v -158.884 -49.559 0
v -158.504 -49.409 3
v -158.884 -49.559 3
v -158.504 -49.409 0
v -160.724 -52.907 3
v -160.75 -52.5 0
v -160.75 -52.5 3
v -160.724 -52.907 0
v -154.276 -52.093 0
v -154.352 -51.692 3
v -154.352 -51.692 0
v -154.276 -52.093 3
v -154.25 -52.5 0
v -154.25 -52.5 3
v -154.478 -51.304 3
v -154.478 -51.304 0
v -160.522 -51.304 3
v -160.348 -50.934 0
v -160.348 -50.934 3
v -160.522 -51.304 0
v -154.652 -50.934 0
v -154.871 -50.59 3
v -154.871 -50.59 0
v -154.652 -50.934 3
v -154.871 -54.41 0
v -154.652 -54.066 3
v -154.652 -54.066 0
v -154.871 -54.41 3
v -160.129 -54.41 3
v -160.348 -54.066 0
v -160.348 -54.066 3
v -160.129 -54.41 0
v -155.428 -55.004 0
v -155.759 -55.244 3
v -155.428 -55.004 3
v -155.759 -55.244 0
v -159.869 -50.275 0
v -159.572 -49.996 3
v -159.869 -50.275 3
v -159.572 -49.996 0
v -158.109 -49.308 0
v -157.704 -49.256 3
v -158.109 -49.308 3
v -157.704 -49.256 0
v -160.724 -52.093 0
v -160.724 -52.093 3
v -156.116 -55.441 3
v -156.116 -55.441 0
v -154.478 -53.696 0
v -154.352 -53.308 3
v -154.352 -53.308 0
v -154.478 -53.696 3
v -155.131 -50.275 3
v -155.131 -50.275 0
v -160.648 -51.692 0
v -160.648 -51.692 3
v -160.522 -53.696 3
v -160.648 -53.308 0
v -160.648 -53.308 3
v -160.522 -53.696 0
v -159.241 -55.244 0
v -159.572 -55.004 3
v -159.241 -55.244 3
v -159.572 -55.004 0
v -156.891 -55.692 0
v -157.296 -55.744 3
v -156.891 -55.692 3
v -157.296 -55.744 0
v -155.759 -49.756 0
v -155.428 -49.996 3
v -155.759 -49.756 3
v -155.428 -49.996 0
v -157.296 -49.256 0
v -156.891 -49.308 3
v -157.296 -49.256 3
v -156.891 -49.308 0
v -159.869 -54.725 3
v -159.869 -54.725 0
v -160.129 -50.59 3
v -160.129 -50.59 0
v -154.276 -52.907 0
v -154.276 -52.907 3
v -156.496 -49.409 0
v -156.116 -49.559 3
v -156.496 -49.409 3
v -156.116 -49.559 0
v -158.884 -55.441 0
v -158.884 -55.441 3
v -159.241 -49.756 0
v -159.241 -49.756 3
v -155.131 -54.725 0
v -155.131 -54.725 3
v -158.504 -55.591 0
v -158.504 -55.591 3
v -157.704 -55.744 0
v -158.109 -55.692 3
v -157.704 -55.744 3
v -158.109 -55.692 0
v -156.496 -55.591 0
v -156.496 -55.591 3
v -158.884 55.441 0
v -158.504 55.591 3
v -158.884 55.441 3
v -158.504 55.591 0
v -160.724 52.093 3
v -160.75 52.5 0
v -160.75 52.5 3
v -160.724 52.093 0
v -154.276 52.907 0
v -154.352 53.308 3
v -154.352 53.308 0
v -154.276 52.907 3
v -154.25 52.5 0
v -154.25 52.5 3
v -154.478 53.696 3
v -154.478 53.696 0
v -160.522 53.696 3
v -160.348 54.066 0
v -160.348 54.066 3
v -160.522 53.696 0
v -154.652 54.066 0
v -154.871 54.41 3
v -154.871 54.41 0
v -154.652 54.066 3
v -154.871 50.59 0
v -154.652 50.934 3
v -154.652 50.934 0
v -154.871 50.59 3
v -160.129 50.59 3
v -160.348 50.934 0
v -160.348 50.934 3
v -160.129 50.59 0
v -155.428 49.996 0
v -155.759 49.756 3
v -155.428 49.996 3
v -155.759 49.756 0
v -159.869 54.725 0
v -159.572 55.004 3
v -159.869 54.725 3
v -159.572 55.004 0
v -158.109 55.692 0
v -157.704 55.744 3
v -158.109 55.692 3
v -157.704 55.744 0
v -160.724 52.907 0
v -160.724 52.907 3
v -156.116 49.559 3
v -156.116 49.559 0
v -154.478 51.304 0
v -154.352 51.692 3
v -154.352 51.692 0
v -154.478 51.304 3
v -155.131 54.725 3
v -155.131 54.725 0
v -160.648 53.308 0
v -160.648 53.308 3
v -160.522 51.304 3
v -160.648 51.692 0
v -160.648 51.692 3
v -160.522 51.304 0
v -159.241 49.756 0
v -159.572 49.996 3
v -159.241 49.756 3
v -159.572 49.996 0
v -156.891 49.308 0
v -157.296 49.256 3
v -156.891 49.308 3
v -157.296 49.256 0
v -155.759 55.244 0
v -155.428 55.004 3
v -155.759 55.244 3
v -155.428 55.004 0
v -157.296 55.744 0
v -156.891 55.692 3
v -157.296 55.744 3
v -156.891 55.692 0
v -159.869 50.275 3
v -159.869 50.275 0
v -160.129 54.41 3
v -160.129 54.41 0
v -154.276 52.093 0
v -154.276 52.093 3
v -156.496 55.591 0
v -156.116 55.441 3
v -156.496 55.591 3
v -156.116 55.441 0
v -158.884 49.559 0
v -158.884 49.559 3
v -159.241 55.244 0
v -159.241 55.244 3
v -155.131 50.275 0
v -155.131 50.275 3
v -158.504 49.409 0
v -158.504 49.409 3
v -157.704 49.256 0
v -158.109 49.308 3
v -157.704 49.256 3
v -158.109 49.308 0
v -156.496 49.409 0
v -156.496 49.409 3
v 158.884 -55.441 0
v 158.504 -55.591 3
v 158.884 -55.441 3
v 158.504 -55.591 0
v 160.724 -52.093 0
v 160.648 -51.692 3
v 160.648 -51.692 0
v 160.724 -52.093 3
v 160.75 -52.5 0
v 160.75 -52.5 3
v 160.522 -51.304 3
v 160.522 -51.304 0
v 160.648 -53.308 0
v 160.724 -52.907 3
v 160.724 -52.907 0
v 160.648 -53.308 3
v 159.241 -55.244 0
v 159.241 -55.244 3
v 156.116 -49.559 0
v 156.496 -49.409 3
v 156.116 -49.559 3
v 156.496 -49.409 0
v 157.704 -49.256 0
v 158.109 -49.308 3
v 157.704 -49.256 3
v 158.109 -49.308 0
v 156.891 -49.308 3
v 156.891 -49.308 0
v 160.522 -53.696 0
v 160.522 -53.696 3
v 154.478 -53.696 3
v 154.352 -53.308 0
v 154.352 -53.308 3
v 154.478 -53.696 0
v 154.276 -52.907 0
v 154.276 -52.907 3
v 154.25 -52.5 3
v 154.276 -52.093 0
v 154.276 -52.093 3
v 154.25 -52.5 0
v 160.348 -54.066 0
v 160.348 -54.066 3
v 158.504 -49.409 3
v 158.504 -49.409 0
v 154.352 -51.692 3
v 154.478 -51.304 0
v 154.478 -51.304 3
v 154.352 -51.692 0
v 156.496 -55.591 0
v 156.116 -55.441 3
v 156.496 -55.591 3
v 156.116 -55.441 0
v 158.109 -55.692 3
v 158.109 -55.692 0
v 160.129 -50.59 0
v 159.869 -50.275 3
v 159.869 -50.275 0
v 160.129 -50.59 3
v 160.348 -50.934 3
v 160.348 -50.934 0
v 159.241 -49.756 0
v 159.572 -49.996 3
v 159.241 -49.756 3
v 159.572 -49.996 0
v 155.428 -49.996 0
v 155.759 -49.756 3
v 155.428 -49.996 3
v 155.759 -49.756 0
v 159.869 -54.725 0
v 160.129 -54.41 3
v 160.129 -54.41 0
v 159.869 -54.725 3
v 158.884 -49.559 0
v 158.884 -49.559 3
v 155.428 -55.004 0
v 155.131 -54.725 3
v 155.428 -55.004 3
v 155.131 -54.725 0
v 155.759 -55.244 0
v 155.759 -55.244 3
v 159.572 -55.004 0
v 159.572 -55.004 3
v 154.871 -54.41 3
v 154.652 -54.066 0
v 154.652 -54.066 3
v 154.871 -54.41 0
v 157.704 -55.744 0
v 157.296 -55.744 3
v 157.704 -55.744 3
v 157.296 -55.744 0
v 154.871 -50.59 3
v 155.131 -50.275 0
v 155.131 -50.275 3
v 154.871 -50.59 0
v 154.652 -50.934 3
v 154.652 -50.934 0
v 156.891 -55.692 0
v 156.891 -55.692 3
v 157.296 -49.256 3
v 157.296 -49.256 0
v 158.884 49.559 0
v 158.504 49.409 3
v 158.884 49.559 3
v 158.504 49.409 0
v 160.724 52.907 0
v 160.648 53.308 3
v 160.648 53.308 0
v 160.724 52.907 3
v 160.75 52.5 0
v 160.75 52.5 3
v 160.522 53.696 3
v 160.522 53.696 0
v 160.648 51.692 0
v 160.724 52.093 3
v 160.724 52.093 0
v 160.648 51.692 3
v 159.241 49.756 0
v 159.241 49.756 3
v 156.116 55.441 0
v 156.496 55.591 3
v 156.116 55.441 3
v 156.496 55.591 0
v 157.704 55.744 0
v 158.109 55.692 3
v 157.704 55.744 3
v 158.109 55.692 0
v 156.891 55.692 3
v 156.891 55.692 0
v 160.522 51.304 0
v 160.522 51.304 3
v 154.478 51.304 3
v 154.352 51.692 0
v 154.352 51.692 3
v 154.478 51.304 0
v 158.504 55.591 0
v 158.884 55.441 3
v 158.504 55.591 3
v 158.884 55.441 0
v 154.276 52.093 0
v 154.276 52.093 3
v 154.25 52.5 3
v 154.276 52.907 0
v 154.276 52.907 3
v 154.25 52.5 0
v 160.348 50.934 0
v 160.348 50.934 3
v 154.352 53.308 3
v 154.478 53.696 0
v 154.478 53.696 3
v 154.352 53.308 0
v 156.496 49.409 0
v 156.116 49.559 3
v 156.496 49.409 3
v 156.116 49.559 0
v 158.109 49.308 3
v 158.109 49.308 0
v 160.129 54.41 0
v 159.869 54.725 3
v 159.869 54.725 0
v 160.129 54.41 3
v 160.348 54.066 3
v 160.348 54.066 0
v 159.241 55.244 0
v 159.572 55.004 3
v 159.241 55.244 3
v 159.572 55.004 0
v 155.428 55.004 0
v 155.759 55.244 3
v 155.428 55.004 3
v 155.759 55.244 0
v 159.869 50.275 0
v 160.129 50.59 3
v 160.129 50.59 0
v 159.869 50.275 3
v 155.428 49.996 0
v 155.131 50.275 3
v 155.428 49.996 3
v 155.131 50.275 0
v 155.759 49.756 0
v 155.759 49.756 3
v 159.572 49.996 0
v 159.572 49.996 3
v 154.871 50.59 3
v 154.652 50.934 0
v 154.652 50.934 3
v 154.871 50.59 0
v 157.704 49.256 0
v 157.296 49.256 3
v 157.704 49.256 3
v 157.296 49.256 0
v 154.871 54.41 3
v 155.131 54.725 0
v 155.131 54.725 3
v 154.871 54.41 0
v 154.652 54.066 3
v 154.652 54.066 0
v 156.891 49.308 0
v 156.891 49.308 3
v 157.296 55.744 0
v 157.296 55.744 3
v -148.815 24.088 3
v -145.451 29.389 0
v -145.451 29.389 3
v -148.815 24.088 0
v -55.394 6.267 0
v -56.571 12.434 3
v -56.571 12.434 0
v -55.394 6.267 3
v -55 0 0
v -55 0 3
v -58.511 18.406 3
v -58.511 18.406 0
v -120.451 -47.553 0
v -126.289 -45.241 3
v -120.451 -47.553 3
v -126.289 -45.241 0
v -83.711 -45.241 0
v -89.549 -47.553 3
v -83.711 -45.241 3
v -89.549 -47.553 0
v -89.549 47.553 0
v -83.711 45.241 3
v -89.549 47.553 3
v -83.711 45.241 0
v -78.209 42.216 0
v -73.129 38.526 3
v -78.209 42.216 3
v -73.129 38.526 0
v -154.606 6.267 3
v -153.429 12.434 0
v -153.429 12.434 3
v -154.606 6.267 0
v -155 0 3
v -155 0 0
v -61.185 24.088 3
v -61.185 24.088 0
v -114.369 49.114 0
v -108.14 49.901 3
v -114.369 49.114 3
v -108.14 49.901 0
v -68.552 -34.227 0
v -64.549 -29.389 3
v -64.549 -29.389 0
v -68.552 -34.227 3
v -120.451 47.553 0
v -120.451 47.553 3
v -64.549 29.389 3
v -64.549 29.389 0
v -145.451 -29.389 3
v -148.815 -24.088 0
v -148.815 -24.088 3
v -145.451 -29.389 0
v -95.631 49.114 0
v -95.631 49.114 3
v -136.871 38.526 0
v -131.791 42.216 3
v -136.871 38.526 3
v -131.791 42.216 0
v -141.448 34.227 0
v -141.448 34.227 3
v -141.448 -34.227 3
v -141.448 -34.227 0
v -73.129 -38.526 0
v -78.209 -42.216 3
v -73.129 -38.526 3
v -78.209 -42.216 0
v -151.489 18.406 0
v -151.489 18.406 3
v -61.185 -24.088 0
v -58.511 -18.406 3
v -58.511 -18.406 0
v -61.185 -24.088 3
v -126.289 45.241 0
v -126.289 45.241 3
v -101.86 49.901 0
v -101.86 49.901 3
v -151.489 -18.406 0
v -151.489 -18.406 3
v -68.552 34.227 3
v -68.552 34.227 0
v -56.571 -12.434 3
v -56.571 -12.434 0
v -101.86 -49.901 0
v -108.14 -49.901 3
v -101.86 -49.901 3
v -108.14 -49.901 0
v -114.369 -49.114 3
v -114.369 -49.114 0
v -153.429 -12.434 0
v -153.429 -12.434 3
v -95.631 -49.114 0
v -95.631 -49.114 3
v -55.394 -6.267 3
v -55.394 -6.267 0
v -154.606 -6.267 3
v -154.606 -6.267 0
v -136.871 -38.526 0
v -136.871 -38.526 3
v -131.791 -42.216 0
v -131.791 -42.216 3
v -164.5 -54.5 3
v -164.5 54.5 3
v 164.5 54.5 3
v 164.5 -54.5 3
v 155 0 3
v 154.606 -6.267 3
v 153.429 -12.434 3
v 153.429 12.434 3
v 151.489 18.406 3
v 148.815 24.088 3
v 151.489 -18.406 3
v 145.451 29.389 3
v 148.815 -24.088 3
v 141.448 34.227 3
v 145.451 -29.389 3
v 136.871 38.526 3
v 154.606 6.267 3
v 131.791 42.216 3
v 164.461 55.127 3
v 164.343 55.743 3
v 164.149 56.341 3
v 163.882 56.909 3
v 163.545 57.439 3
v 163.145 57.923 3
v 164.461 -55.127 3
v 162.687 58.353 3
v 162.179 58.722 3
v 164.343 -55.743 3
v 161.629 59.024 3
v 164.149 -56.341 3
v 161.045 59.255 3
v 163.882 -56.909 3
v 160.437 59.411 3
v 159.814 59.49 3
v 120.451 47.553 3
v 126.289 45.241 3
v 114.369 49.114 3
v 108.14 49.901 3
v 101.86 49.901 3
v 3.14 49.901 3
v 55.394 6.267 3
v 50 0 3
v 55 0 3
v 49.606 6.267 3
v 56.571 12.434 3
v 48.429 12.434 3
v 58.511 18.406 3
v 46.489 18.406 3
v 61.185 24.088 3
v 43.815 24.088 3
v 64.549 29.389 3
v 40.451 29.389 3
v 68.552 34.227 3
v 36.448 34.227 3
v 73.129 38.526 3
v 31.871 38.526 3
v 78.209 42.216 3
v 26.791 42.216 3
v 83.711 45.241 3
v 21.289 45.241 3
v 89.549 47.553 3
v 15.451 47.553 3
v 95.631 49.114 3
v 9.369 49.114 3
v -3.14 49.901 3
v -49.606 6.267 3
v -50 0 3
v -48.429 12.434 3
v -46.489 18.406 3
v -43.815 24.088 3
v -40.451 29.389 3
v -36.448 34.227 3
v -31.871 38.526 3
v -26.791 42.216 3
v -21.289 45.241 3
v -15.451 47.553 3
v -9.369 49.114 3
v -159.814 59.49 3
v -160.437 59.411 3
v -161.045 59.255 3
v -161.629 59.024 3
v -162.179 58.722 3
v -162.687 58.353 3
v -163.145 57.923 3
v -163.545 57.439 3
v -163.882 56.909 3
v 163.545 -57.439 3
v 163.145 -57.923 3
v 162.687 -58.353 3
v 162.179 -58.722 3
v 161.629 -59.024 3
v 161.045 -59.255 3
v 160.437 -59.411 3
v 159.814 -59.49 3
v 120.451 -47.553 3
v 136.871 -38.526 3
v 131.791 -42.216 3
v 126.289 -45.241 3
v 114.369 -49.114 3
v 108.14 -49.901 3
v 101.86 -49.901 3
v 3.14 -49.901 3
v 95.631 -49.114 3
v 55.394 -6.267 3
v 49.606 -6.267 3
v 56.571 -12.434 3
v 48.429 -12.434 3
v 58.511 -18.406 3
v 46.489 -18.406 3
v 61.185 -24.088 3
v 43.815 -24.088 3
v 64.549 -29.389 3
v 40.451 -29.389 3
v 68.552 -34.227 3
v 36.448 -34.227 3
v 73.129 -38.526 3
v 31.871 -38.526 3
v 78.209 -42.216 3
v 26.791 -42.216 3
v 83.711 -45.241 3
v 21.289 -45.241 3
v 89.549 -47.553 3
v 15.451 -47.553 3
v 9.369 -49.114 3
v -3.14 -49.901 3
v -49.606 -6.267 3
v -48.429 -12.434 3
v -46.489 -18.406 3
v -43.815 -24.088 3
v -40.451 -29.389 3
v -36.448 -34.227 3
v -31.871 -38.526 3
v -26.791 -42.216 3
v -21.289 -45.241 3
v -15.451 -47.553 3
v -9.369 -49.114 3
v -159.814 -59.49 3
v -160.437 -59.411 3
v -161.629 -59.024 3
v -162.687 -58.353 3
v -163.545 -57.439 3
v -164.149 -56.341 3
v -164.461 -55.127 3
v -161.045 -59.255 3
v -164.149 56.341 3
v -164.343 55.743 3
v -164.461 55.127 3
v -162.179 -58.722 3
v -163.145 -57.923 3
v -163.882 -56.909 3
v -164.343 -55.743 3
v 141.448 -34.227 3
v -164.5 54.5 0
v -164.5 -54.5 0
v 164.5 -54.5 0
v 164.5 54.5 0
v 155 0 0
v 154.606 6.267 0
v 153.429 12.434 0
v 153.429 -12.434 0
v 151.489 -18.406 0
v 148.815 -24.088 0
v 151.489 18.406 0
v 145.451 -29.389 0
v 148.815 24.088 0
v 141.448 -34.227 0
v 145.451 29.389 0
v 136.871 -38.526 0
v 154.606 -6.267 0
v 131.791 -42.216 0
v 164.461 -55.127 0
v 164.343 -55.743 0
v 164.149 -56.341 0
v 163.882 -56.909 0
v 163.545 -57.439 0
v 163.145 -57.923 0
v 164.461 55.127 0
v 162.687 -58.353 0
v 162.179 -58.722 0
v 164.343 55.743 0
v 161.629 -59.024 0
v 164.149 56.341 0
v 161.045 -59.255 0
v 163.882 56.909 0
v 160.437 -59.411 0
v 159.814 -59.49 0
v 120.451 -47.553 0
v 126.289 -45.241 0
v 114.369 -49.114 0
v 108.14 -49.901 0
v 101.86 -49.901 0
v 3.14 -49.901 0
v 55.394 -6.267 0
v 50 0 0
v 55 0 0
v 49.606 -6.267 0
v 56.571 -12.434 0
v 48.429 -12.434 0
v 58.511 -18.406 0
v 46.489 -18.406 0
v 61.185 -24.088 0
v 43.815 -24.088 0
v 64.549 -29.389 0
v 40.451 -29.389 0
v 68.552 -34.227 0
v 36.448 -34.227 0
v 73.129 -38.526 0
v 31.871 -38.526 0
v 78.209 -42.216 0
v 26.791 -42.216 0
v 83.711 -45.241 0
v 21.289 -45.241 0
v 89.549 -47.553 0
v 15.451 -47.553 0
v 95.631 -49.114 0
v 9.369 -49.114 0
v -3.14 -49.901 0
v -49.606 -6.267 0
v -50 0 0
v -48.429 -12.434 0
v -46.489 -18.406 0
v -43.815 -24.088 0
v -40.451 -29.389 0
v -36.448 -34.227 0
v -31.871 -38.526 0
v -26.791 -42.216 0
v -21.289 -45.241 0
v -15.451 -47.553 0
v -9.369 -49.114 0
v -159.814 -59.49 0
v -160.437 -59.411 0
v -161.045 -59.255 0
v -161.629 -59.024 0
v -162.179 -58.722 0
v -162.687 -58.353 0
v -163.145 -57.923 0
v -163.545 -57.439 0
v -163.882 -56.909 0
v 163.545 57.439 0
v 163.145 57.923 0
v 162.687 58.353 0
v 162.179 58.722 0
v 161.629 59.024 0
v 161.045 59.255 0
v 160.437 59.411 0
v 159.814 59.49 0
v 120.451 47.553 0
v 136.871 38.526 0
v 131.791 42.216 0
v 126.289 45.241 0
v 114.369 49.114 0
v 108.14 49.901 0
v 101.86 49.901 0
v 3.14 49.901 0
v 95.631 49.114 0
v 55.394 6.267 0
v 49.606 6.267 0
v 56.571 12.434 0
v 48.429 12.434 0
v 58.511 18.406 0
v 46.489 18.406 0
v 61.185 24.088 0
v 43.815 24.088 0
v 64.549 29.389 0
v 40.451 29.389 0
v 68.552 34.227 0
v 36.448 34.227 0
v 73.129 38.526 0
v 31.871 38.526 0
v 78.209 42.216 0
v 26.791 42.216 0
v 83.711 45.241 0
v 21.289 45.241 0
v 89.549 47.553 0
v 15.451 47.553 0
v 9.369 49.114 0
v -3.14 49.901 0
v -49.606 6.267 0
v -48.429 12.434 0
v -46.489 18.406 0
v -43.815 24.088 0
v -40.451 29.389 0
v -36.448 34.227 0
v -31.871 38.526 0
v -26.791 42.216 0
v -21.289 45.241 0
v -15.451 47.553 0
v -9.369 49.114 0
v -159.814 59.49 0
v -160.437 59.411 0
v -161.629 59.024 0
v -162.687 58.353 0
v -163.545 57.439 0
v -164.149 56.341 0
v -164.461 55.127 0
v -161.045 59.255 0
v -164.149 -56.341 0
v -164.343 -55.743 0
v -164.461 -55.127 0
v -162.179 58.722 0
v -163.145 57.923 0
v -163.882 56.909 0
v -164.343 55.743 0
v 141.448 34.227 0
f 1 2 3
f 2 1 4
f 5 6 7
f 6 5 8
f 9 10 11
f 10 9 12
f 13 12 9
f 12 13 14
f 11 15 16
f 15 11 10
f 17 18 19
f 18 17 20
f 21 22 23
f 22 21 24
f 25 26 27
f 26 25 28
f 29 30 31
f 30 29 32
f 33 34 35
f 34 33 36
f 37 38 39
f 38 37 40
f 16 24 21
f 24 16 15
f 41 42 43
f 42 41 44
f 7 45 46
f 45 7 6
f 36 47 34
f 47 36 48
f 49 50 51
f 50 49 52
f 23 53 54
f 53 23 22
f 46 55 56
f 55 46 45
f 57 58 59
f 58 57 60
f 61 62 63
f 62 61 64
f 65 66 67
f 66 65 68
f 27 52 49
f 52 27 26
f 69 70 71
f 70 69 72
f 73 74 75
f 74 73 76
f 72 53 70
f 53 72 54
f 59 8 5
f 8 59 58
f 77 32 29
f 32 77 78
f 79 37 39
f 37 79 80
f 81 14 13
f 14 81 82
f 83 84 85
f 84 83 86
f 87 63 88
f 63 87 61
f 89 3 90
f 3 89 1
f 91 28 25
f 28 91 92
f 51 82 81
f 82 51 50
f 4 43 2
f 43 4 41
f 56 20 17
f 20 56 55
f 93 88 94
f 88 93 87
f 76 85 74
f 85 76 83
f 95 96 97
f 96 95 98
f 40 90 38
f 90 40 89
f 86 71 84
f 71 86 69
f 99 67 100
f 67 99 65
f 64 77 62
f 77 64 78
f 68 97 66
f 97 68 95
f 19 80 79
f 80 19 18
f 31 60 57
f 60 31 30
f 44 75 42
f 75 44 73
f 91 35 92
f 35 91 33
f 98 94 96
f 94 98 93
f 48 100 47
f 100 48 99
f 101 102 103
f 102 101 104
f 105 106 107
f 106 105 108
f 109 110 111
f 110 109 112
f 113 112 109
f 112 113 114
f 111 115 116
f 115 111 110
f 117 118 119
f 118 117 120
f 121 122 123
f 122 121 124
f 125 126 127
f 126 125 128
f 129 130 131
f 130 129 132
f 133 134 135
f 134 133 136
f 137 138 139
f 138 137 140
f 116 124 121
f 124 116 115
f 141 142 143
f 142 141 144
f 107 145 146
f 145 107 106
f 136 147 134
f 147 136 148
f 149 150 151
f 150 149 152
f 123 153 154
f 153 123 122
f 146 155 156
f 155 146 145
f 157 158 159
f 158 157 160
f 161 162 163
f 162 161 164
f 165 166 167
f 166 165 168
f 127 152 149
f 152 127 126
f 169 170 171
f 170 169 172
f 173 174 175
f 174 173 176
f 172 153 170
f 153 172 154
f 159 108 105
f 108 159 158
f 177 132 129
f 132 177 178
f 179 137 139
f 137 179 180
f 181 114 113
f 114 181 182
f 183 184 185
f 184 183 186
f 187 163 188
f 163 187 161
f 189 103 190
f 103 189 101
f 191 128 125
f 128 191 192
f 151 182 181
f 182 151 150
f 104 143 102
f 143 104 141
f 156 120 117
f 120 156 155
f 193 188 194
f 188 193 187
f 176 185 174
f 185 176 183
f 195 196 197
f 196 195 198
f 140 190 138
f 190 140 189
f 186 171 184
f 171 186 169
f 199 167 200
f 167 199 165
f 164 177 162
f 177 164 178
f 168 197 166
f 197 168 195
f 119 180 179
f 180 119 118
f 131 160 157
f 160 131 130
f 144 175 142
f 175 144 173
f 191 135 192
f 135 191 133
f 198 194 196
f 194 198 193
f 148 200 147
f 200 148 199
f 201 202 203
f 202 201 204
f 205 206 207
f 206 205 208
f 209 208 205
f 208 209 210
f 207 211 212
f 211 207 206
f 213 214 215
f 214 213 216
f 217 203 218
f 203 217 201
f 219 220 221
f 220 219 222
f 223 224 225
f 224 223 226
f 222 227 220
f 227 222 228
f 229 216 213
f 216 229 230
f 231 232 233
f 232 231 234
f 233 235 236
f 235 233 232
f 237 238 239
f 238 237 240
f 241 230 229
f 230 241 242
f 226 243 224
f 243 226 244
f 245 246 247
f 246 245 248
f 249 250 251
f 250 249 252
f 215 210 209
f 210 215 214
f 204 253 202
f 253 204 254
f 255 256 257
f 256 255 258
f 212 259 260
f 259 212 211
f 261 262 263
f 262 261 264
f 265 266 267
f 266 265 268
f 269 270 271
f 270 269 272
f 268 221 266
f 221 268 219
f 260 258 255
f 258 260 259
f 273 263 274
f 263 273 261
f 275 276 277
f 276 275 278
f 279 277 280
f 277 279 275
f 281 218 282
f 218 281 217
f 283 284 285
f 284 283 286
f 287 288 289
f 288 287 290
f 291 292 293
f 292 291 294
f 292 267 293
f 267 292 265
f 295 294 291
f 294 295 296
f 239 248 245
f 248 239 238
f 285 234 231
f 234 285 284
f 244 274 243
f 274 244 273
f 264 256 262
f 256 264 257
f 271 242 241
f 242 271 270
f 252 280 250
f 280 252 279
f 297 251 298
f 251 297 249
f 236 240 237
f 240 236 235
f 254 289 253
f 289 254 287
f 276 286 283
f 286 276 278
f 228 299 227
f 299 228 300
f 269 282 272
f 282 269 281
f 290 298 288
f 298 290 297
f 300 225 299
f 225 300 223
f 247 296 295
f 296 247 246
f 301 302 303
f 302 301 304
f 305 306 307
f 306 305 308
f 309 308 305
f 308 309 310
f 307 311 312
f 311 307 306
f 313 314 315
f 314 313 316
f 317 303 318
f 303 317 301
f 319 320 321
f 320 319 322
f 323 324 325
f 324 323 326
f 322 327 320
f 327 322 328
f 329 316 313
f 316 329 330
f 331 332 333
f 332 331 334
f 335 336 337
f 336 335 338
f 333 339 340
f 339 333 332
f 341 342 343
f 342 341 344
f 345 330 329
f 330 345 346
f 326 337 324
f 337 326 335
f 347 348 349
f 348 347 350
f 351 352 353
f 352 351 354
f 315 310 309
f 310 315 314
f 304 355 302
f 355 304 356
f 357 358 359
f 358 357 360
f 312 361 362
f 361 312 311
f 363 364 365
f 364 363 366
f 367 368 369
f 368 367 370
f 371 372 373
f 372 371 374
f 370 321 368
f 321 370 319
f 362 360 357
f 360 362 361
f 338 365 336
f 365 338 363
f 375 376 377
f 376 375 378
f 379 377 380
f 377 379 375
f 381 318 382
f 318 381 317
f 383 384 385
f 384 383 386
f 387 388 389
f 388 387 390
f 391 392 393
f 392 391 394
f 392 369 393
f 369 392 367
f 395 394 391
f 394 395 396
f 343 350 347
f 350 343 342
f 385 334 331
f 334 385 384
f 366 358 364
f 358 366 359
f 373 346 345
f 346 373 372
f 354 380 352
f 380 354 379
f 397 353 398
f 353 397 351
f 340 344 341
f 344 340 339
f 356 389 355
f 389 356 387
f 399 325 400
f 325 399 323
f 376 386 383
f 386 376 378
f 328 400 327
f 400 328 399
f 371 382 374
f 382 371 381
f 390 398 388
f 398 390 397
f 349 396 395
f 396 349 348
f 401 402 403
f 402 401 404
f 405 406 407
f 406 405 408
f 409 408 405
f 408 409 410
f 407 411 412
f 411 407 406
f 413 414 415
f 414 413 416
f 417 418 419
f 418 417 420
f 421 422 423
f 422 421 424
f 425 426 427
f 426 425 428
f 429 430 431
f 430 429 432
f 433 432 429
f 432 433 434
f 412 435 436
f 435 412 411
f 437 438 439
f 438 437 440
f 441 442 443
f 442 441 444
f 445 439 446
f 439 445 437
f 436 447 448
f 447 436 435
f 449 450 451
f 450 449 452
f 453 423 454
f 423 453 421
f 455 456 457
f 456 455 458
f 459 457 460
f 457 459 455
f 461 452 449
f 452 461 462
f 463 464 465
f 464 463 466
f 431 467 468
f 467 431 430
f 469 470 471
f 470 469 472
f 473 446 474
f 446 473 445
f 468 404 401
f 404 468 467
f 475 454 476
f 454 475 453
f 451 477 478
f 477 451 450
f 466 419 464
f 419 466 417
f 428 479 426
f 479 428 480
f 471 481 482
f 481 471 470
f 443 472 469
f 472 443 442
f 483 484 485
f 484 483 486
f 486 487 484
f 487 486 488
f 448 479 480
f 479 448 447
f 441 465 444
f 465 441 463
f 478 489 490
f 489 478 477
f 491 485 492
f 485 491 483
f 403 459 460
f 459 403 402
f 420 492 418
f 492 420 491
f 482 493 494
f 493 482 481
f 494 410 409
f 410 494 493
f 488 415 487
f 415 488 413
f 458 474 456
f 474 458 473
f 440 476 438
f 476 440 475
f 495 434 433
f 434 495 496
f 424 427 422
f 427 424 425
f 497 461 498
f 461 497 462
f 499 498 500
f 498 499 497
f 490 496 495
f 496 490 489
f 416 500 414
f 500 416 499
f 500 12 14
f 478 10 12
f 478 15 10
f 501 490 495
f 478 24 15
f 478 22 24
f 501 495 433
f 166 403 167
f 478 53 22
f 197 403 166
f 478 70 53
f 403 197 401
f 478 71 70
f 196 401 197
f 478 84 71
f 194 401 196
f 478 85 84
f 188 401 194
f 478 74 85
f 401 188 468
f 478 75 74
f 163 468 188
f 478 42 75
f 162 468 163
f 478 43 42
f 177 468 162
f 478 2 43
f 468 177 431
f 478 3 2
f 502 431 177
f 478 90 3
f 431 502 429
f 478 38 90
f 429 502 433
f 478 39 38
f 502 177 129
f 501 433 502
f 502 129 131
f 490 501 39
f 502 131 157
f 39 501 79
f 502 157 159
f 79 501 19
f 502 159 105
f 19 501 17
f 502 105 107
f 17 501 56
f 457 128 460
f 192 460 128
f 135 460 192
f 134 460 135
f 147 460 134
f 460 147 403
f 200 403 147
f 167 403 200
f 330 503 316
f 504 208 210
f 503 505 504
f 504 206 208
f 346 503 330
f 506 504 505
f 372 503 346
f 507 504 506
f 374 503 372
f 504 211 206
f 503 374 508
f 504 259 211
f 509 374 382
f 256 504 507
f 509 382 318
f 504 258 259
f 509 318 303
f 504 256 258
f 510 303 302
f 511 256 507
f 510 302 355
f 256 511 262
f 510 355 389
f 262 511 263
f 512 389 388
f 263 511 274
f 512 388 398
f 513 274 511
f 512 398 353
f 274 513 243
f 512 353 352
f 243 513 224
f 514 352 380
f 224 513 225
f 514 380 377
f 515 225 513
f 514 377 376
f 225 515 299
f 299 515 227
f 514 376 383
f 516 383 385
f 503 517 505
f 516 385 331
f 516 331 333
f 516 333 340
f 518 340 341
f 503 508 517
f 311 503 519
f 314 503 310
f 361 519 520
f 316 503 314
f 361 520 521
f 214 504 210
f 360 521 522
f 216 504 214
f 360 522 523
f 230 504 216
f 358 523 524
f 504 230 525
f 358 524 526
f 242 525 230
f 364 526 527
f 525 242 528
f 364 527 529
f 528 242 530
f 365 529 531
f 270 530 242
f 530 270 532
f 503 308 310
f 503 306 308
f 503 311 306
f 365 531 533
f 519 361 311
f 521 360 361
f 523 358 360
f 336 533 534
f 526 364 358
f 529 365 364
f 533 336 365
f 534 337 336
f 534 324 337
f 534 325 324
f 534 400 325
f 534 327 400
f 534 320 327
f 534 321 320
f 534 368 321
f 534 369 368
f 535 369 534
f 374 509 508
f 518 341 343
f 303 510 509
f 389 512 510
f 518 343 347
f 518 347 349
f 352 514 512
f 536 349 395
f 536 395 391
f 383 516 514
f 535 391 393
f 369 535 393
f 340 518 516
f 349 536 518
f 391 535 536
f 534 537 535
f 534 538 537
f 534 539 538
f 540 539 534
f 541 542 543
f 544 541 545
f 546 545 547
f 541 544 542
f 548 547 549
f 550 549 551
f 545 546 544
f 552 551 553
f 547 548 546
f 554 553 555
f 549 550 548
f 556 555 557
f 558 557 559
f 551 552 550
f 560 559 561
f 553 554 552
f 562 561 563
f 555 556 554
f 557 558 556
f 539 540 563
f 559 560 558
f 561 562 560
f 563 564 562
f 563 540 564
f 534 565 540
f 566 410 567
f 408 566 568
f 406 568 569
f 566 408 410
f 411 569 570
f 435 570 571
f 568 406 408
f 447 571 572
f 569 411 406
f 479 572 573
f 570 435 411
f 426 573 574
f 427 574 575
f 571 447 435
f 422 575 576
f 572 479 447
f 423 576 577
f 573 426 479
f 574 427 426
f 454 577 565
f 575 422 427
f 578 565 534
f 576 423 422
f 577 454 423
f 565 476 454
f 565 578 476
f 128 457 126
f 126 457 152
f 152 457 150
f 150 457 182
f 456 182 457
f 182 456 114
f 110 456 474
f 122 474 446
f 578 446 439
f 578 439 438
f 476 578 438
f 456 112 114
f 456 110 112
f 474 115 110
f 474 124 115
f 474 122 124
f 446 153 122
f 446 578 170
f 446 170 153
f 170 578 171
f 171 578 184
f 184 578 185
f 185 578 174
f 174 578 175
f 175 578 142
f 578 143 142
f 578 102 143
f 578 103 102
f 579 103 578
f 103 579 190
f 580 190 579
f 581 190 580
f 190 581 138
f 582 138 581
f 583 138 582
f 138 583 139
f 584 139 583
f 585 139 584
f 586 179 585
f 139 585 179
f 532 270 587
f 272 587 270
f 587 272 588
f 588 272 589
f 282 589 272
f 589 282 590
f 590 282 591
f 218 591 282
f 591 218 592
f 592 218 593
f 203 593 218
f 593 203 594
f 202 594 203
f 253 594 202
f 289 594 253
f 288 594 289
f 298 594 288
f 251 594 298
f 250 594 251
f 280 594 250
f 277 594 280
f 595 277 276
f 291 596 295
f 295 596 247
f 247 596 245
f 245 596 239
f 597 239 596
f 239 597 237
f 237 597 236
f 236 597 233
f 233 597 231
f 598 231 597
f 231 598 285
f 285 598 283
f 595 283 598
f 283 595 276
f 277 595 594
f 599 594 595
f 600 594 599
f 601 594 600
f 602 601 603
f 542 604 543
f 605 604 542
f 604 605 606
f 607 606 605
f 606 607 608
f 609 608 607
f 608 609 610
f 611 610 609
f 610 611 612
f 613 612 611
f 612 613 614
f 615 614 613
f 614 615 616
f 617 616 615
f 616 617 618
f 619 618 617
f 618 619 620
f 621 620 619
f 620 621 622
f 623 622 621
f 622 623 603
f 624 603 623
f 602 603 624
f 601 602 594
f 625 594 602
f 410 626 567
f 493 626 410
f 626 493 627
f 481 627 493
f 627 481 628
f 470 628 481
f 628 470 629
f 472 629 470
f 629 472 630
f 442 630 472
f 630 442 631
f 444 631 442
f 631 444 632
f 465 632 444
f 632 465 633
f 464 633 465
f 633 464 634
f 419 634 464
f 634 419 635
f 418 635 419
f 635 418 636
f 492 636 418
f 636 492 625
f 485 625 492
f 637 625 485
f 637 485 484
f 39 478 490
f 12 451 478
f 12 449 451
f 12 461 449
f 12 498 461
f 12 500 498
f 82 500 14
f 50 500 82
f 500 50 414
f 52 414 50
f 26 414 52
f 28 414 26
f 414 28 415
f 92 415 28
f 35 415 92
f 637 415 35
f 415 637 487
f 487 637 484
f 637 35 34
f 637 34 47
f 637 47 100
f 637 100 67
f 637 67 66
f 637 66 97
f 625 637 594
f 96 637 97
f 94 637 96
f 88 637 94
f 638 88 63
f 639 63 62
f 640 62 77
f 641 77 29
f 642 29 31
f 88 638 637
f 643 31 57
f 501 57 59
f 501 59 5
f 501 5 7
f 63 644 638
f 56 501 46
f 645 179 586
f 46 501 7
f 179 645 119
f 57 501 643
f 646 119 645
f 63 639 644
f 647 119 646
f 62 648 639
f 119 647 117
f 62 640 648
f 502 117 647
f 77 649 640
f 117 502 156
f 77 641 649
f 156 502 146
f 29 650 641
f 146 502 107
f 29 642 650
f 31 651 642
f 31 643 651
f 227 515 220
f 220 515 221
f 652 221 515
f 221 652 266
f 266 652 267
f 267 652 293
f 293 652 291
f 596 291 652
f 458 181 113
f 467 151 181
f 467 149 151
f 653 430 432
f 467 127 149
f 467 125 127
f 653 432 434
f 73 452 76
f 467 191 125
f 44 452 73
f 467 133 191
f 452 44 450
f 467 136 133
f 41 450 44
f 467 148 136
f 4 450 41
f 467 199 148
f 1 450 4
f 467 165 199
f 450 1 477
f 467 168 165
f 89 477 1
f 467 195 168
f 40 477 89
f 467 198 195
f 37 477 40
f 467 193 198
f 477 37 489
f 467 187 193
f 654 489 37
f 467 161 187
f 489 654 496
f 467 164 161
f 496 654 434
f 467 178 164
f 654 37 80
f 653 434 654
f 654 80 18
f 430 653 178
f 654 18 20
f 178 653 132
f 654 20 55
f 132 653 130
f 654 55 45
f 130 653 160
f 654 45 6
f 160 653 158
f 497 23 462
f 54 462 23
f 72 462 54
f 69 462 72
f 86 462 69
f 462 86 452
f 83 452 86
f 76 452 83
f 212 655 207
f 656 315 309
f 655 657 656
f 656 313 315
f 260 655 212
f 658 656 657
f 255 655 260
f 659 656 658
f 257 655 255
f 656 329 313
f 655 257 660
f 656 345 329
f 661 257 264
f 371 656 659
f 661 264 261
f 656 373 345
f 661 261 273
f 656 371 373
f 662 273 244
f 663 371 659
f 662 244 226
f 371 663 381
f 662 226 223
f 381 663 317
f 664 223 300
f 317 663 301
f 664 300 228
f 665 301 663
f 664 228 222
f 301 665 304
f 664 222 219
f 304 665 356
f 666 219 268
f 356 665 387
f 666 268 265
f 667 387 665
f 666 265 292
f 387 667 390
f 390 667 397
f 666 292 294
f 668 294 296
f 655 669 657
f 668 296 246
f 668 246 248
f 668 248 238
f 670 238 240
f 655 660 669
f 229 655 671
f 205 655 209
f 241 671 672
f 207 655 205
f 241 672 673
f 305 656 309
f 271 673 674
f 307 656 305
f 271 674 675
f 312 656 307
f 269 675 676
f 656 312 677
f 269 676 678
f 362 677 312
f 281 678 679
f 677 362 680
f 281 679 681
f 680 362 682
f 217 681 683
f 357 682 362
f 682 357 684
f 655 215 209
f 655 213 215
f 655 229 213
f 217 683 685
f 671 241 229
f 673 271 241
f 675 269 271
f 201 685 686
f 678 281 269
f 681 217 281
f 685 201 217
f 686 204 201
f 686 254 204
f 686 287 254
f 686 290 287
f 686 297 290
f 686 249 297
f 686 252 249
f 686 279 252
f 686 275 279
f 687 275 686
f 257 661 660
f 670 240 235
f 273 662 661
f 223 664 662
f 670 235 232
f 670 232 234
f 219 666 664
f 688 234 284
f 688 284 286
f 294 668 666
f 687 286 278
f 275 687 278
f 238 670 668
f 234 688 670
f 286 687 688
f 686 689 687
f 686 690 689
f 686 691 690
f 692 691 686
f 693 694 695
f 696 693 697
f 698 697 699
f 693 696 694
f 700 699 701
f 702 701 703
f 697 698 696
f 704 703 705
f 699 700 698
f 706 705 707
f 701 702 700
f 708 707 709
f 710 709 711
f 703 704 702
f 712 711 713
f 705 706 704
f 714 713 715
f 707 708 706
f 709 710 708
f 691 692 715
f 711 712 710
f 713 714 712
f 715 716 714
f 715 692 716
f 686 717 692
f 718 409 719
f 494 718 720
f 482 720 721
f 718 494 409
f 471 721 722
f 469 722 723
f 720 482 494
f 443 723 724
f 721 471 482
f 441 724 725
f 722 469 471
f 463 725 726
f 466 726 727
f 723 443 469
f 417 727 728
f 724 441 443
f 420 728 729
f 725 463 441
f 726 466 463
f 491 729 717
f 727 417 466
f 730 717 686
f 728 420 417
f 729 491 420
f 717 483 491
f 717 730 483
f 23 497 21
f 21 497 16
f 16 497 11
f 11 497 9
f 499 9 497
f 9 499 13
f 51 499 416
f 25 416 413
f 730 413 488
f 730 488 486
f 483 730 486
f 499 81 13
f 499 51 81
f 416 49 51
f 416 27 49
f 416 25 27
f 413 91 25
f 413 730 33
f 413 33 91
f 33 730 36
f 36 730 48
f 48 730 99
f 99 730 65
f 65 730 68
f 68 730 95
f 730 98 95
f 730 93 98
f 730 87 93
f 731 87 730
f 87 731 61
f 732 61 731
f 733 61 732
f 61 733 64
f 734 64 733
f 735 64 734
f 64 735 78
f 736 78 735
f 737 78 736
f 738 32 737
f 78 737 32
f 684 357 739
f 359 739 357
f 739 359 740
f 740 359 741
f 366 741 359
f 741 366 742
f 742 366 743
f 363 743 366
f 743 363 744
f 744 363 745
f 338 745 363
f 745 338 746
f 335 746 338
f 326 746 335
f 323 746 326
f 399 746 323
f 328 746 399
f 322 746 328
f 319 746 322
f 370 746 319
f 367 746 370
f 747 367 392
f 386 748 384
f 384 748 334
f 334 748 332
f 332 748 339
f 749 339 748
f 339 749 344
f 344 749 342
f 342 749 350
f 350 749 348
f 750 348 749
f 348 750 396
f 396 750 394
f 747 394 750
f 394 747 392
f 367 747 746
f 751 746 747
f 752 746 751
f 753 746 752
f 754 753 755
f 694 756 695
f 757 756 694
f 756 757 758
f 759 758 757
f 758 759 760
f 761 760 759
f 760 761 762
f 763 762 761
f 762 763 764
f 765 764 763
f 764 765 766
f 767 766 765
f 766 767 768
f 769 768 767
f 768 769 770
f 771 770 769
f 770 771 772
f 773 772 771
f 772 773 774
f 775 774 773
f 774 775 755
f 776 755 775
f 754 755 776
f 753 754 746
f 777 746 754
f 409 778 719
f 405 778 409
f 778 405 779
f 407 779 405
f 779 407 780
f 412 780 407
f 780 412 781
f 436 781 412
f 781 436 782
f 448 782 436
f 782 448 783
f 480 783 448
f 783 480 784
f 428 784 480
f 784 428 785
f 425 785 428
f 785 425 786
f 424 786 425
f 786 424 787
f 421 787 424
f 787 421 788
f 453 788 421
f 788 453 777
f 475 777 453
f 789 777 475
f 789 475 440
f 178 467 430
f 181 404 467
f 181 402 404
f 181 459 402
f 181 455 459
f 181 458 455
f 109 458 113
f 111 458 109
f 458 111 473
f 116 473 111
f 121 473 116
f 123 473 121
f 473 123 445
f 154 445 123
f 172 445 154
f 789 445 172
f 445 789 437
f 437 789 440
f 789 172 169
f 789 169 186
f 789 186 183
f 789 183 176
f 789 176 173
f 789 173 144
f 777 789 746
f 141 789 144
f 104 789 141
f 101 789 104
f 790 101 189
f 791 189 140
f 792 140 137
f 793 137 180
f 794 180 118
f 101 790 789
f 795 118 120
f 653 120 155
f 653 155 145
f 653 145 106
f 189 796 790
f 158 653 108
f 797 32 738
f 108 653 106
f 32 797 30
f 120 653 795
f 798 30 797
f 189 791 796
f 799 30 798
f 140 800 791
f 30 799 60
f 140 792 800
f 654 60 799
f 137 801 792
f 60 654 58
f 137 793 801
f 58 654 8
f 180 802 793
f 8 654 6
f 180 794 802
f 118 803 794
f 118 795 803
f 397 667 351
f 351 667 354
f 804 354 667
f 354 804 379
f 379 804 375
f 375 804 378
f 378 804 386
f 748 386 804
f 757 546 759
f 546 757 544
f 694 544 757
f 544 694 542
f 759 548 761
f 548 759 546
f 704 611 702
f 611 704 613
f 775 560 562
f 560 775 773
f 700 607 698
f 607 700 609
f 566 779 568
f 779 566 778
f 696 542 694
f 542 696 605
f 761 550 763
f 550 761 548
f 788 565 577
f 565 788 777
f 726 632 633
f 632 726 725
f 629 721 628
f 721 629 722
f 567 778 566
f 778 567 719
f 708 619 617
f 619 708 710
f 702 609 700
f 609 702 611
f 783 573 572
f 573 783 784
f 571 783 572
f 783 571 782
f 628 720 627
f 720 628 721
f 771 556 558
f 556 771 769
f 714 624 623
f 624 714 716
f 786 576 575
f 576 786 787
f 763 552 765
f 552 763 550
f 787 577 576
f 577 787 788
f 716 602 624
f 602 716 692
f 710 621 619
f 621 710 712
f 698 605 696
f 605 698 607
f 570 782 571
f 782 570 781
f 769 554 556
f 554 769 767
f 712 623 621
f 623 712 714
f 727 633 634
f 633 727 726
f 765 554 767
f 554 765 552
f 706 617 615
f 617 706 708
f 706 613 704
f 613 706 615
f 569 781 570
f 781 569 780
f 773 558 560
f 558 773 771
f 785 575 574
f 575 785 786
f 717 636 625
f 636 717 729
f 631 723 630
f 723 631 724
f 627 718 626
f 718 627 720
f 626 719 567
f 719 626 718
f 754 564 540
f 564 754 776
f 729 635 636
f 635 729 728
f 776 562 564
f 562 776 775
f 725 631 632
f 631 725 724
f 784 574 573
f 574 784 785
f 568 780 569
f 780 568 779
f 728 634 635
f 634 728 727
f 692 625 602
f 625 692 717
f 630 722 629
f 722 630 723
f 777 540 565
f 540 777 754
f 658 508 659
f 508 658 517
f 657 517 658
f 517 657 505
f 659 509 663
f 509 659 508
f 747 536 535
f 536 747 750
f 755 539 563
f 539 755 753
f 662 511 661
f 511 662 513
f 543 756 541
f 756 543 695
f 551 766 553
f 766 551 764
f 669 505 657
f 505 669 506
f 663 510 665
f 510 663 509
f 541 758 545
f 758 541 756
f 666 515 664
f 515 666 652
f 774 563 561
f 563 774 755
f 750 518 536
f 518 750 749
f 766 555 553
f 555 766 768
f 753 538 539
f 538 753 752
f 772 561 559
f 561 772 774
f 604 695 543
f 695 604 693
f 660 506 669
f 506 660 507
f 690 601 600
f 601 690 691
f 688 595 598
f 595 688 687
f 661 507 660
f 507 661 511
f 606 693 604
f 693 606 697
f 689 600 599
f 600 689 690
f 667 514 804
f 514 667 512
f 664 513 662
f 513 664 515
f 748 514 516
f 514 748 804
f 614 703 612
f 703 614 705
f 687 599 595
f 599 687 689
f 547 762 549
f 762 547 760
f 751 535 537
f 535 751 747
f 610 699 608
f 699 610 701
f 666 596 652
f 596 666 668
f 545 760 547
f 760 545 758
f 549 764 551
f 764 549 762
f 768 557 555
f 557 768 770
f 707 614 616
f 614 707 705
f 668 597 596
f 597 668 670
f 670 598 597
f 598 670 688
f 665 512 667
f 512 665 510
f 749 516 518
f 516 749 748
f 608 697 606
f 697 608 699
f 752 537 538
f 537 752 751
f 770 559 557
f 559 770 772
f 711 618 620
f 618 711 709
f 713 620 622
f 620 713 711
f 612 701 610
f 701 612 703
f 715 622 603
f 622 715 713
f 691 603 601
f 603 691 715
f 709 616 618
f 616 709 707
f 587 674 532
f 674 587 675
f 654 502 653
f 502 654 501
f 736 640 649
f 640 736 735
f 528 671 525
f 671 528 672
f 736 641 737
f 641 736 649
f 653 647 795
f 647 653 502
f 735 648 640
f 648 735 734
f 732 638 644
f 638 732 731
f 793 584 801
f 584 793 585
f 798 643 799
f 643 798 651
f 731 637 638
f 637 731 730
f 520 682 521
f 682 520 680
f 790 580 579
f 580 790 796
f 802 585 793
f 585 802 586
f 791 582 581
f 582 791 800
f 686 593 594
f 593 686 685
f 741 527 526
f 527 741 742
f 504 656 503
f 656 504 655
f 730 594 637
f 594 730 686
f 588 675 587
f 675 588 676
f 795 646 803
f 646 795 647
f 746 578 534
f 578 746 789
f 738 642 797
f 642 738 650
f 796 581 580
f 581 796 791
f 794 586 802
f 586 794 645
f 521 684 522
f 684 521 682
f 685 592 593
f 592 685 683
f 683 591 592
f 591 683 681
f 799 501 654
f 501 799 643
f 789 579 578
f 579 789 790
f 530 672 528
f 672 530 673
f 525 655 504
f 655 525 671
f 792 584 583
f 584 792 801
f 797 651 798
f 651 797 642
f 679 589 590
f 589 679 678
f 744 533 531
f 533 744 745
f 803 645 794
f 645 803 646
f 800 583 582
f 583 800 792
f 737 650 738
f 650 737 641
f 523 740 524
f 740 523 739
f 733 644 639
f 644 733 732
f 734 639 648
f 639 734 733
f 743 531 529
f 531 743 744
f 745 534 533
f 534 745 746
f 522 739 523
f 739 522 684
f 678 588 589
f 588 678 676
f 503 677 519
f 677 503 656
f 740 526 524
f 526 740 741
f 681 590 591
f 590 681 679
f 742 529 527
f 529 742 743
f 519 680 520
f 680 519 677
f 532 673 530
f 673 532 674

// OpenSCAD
$fn = 50;


difference() {
	union() {
		hull() {
			translate(v = [-159.5000000000, 54.5000000000, 0]) {
				cylinder(h = 3, r = 5);
			}
			translate(v = [159.5000000000, 54.5000000000, 0]) {
				cylinder(h = 3, r = 5);
			}
			translate(v = [-159.5000000000, -54.5000000000, 0]) {
				cylinder(h = 3, r = 5);
			}
			translate(v = [159.5000000000, -54.5000000000, 0]) {
				cylinder(h = 3, r = 5);
			}
		}
	}
	union() {
		#translate(v = [-157.5000000000, -52.5000000000, -100.0000000000]) {
			cylinder(h = 200, r = 3.2500000000);
		}
		#translate(v = [-157.5000000000, 52.5000000000, -100.0000000000]) {
			cylinder(h = 200, r = 3.2500000000);
		}
		#translate(v = [157.5000000000, -52.5000000000, -100.0000000000]) {
			cylinder(h = 200, r = 3.2500000000);
		}
		#translate(v = [157.5000000000, 52.5000000000, -100.0000000000]) {
			cylinder(h = 200, r = 3.2500000000);
		}
		#translate(v = [-105.0000000000, 0, 0]) {
			cylinder(h = 3, r = 50.0000000000);
		}
		#cylinder(h = 3, r = 50.0000000000);
		#translate(v = [105.0000000000, 0, 0]) {
			cylinder(h = 3, r = 50.0000000000);
		}
	}
}
